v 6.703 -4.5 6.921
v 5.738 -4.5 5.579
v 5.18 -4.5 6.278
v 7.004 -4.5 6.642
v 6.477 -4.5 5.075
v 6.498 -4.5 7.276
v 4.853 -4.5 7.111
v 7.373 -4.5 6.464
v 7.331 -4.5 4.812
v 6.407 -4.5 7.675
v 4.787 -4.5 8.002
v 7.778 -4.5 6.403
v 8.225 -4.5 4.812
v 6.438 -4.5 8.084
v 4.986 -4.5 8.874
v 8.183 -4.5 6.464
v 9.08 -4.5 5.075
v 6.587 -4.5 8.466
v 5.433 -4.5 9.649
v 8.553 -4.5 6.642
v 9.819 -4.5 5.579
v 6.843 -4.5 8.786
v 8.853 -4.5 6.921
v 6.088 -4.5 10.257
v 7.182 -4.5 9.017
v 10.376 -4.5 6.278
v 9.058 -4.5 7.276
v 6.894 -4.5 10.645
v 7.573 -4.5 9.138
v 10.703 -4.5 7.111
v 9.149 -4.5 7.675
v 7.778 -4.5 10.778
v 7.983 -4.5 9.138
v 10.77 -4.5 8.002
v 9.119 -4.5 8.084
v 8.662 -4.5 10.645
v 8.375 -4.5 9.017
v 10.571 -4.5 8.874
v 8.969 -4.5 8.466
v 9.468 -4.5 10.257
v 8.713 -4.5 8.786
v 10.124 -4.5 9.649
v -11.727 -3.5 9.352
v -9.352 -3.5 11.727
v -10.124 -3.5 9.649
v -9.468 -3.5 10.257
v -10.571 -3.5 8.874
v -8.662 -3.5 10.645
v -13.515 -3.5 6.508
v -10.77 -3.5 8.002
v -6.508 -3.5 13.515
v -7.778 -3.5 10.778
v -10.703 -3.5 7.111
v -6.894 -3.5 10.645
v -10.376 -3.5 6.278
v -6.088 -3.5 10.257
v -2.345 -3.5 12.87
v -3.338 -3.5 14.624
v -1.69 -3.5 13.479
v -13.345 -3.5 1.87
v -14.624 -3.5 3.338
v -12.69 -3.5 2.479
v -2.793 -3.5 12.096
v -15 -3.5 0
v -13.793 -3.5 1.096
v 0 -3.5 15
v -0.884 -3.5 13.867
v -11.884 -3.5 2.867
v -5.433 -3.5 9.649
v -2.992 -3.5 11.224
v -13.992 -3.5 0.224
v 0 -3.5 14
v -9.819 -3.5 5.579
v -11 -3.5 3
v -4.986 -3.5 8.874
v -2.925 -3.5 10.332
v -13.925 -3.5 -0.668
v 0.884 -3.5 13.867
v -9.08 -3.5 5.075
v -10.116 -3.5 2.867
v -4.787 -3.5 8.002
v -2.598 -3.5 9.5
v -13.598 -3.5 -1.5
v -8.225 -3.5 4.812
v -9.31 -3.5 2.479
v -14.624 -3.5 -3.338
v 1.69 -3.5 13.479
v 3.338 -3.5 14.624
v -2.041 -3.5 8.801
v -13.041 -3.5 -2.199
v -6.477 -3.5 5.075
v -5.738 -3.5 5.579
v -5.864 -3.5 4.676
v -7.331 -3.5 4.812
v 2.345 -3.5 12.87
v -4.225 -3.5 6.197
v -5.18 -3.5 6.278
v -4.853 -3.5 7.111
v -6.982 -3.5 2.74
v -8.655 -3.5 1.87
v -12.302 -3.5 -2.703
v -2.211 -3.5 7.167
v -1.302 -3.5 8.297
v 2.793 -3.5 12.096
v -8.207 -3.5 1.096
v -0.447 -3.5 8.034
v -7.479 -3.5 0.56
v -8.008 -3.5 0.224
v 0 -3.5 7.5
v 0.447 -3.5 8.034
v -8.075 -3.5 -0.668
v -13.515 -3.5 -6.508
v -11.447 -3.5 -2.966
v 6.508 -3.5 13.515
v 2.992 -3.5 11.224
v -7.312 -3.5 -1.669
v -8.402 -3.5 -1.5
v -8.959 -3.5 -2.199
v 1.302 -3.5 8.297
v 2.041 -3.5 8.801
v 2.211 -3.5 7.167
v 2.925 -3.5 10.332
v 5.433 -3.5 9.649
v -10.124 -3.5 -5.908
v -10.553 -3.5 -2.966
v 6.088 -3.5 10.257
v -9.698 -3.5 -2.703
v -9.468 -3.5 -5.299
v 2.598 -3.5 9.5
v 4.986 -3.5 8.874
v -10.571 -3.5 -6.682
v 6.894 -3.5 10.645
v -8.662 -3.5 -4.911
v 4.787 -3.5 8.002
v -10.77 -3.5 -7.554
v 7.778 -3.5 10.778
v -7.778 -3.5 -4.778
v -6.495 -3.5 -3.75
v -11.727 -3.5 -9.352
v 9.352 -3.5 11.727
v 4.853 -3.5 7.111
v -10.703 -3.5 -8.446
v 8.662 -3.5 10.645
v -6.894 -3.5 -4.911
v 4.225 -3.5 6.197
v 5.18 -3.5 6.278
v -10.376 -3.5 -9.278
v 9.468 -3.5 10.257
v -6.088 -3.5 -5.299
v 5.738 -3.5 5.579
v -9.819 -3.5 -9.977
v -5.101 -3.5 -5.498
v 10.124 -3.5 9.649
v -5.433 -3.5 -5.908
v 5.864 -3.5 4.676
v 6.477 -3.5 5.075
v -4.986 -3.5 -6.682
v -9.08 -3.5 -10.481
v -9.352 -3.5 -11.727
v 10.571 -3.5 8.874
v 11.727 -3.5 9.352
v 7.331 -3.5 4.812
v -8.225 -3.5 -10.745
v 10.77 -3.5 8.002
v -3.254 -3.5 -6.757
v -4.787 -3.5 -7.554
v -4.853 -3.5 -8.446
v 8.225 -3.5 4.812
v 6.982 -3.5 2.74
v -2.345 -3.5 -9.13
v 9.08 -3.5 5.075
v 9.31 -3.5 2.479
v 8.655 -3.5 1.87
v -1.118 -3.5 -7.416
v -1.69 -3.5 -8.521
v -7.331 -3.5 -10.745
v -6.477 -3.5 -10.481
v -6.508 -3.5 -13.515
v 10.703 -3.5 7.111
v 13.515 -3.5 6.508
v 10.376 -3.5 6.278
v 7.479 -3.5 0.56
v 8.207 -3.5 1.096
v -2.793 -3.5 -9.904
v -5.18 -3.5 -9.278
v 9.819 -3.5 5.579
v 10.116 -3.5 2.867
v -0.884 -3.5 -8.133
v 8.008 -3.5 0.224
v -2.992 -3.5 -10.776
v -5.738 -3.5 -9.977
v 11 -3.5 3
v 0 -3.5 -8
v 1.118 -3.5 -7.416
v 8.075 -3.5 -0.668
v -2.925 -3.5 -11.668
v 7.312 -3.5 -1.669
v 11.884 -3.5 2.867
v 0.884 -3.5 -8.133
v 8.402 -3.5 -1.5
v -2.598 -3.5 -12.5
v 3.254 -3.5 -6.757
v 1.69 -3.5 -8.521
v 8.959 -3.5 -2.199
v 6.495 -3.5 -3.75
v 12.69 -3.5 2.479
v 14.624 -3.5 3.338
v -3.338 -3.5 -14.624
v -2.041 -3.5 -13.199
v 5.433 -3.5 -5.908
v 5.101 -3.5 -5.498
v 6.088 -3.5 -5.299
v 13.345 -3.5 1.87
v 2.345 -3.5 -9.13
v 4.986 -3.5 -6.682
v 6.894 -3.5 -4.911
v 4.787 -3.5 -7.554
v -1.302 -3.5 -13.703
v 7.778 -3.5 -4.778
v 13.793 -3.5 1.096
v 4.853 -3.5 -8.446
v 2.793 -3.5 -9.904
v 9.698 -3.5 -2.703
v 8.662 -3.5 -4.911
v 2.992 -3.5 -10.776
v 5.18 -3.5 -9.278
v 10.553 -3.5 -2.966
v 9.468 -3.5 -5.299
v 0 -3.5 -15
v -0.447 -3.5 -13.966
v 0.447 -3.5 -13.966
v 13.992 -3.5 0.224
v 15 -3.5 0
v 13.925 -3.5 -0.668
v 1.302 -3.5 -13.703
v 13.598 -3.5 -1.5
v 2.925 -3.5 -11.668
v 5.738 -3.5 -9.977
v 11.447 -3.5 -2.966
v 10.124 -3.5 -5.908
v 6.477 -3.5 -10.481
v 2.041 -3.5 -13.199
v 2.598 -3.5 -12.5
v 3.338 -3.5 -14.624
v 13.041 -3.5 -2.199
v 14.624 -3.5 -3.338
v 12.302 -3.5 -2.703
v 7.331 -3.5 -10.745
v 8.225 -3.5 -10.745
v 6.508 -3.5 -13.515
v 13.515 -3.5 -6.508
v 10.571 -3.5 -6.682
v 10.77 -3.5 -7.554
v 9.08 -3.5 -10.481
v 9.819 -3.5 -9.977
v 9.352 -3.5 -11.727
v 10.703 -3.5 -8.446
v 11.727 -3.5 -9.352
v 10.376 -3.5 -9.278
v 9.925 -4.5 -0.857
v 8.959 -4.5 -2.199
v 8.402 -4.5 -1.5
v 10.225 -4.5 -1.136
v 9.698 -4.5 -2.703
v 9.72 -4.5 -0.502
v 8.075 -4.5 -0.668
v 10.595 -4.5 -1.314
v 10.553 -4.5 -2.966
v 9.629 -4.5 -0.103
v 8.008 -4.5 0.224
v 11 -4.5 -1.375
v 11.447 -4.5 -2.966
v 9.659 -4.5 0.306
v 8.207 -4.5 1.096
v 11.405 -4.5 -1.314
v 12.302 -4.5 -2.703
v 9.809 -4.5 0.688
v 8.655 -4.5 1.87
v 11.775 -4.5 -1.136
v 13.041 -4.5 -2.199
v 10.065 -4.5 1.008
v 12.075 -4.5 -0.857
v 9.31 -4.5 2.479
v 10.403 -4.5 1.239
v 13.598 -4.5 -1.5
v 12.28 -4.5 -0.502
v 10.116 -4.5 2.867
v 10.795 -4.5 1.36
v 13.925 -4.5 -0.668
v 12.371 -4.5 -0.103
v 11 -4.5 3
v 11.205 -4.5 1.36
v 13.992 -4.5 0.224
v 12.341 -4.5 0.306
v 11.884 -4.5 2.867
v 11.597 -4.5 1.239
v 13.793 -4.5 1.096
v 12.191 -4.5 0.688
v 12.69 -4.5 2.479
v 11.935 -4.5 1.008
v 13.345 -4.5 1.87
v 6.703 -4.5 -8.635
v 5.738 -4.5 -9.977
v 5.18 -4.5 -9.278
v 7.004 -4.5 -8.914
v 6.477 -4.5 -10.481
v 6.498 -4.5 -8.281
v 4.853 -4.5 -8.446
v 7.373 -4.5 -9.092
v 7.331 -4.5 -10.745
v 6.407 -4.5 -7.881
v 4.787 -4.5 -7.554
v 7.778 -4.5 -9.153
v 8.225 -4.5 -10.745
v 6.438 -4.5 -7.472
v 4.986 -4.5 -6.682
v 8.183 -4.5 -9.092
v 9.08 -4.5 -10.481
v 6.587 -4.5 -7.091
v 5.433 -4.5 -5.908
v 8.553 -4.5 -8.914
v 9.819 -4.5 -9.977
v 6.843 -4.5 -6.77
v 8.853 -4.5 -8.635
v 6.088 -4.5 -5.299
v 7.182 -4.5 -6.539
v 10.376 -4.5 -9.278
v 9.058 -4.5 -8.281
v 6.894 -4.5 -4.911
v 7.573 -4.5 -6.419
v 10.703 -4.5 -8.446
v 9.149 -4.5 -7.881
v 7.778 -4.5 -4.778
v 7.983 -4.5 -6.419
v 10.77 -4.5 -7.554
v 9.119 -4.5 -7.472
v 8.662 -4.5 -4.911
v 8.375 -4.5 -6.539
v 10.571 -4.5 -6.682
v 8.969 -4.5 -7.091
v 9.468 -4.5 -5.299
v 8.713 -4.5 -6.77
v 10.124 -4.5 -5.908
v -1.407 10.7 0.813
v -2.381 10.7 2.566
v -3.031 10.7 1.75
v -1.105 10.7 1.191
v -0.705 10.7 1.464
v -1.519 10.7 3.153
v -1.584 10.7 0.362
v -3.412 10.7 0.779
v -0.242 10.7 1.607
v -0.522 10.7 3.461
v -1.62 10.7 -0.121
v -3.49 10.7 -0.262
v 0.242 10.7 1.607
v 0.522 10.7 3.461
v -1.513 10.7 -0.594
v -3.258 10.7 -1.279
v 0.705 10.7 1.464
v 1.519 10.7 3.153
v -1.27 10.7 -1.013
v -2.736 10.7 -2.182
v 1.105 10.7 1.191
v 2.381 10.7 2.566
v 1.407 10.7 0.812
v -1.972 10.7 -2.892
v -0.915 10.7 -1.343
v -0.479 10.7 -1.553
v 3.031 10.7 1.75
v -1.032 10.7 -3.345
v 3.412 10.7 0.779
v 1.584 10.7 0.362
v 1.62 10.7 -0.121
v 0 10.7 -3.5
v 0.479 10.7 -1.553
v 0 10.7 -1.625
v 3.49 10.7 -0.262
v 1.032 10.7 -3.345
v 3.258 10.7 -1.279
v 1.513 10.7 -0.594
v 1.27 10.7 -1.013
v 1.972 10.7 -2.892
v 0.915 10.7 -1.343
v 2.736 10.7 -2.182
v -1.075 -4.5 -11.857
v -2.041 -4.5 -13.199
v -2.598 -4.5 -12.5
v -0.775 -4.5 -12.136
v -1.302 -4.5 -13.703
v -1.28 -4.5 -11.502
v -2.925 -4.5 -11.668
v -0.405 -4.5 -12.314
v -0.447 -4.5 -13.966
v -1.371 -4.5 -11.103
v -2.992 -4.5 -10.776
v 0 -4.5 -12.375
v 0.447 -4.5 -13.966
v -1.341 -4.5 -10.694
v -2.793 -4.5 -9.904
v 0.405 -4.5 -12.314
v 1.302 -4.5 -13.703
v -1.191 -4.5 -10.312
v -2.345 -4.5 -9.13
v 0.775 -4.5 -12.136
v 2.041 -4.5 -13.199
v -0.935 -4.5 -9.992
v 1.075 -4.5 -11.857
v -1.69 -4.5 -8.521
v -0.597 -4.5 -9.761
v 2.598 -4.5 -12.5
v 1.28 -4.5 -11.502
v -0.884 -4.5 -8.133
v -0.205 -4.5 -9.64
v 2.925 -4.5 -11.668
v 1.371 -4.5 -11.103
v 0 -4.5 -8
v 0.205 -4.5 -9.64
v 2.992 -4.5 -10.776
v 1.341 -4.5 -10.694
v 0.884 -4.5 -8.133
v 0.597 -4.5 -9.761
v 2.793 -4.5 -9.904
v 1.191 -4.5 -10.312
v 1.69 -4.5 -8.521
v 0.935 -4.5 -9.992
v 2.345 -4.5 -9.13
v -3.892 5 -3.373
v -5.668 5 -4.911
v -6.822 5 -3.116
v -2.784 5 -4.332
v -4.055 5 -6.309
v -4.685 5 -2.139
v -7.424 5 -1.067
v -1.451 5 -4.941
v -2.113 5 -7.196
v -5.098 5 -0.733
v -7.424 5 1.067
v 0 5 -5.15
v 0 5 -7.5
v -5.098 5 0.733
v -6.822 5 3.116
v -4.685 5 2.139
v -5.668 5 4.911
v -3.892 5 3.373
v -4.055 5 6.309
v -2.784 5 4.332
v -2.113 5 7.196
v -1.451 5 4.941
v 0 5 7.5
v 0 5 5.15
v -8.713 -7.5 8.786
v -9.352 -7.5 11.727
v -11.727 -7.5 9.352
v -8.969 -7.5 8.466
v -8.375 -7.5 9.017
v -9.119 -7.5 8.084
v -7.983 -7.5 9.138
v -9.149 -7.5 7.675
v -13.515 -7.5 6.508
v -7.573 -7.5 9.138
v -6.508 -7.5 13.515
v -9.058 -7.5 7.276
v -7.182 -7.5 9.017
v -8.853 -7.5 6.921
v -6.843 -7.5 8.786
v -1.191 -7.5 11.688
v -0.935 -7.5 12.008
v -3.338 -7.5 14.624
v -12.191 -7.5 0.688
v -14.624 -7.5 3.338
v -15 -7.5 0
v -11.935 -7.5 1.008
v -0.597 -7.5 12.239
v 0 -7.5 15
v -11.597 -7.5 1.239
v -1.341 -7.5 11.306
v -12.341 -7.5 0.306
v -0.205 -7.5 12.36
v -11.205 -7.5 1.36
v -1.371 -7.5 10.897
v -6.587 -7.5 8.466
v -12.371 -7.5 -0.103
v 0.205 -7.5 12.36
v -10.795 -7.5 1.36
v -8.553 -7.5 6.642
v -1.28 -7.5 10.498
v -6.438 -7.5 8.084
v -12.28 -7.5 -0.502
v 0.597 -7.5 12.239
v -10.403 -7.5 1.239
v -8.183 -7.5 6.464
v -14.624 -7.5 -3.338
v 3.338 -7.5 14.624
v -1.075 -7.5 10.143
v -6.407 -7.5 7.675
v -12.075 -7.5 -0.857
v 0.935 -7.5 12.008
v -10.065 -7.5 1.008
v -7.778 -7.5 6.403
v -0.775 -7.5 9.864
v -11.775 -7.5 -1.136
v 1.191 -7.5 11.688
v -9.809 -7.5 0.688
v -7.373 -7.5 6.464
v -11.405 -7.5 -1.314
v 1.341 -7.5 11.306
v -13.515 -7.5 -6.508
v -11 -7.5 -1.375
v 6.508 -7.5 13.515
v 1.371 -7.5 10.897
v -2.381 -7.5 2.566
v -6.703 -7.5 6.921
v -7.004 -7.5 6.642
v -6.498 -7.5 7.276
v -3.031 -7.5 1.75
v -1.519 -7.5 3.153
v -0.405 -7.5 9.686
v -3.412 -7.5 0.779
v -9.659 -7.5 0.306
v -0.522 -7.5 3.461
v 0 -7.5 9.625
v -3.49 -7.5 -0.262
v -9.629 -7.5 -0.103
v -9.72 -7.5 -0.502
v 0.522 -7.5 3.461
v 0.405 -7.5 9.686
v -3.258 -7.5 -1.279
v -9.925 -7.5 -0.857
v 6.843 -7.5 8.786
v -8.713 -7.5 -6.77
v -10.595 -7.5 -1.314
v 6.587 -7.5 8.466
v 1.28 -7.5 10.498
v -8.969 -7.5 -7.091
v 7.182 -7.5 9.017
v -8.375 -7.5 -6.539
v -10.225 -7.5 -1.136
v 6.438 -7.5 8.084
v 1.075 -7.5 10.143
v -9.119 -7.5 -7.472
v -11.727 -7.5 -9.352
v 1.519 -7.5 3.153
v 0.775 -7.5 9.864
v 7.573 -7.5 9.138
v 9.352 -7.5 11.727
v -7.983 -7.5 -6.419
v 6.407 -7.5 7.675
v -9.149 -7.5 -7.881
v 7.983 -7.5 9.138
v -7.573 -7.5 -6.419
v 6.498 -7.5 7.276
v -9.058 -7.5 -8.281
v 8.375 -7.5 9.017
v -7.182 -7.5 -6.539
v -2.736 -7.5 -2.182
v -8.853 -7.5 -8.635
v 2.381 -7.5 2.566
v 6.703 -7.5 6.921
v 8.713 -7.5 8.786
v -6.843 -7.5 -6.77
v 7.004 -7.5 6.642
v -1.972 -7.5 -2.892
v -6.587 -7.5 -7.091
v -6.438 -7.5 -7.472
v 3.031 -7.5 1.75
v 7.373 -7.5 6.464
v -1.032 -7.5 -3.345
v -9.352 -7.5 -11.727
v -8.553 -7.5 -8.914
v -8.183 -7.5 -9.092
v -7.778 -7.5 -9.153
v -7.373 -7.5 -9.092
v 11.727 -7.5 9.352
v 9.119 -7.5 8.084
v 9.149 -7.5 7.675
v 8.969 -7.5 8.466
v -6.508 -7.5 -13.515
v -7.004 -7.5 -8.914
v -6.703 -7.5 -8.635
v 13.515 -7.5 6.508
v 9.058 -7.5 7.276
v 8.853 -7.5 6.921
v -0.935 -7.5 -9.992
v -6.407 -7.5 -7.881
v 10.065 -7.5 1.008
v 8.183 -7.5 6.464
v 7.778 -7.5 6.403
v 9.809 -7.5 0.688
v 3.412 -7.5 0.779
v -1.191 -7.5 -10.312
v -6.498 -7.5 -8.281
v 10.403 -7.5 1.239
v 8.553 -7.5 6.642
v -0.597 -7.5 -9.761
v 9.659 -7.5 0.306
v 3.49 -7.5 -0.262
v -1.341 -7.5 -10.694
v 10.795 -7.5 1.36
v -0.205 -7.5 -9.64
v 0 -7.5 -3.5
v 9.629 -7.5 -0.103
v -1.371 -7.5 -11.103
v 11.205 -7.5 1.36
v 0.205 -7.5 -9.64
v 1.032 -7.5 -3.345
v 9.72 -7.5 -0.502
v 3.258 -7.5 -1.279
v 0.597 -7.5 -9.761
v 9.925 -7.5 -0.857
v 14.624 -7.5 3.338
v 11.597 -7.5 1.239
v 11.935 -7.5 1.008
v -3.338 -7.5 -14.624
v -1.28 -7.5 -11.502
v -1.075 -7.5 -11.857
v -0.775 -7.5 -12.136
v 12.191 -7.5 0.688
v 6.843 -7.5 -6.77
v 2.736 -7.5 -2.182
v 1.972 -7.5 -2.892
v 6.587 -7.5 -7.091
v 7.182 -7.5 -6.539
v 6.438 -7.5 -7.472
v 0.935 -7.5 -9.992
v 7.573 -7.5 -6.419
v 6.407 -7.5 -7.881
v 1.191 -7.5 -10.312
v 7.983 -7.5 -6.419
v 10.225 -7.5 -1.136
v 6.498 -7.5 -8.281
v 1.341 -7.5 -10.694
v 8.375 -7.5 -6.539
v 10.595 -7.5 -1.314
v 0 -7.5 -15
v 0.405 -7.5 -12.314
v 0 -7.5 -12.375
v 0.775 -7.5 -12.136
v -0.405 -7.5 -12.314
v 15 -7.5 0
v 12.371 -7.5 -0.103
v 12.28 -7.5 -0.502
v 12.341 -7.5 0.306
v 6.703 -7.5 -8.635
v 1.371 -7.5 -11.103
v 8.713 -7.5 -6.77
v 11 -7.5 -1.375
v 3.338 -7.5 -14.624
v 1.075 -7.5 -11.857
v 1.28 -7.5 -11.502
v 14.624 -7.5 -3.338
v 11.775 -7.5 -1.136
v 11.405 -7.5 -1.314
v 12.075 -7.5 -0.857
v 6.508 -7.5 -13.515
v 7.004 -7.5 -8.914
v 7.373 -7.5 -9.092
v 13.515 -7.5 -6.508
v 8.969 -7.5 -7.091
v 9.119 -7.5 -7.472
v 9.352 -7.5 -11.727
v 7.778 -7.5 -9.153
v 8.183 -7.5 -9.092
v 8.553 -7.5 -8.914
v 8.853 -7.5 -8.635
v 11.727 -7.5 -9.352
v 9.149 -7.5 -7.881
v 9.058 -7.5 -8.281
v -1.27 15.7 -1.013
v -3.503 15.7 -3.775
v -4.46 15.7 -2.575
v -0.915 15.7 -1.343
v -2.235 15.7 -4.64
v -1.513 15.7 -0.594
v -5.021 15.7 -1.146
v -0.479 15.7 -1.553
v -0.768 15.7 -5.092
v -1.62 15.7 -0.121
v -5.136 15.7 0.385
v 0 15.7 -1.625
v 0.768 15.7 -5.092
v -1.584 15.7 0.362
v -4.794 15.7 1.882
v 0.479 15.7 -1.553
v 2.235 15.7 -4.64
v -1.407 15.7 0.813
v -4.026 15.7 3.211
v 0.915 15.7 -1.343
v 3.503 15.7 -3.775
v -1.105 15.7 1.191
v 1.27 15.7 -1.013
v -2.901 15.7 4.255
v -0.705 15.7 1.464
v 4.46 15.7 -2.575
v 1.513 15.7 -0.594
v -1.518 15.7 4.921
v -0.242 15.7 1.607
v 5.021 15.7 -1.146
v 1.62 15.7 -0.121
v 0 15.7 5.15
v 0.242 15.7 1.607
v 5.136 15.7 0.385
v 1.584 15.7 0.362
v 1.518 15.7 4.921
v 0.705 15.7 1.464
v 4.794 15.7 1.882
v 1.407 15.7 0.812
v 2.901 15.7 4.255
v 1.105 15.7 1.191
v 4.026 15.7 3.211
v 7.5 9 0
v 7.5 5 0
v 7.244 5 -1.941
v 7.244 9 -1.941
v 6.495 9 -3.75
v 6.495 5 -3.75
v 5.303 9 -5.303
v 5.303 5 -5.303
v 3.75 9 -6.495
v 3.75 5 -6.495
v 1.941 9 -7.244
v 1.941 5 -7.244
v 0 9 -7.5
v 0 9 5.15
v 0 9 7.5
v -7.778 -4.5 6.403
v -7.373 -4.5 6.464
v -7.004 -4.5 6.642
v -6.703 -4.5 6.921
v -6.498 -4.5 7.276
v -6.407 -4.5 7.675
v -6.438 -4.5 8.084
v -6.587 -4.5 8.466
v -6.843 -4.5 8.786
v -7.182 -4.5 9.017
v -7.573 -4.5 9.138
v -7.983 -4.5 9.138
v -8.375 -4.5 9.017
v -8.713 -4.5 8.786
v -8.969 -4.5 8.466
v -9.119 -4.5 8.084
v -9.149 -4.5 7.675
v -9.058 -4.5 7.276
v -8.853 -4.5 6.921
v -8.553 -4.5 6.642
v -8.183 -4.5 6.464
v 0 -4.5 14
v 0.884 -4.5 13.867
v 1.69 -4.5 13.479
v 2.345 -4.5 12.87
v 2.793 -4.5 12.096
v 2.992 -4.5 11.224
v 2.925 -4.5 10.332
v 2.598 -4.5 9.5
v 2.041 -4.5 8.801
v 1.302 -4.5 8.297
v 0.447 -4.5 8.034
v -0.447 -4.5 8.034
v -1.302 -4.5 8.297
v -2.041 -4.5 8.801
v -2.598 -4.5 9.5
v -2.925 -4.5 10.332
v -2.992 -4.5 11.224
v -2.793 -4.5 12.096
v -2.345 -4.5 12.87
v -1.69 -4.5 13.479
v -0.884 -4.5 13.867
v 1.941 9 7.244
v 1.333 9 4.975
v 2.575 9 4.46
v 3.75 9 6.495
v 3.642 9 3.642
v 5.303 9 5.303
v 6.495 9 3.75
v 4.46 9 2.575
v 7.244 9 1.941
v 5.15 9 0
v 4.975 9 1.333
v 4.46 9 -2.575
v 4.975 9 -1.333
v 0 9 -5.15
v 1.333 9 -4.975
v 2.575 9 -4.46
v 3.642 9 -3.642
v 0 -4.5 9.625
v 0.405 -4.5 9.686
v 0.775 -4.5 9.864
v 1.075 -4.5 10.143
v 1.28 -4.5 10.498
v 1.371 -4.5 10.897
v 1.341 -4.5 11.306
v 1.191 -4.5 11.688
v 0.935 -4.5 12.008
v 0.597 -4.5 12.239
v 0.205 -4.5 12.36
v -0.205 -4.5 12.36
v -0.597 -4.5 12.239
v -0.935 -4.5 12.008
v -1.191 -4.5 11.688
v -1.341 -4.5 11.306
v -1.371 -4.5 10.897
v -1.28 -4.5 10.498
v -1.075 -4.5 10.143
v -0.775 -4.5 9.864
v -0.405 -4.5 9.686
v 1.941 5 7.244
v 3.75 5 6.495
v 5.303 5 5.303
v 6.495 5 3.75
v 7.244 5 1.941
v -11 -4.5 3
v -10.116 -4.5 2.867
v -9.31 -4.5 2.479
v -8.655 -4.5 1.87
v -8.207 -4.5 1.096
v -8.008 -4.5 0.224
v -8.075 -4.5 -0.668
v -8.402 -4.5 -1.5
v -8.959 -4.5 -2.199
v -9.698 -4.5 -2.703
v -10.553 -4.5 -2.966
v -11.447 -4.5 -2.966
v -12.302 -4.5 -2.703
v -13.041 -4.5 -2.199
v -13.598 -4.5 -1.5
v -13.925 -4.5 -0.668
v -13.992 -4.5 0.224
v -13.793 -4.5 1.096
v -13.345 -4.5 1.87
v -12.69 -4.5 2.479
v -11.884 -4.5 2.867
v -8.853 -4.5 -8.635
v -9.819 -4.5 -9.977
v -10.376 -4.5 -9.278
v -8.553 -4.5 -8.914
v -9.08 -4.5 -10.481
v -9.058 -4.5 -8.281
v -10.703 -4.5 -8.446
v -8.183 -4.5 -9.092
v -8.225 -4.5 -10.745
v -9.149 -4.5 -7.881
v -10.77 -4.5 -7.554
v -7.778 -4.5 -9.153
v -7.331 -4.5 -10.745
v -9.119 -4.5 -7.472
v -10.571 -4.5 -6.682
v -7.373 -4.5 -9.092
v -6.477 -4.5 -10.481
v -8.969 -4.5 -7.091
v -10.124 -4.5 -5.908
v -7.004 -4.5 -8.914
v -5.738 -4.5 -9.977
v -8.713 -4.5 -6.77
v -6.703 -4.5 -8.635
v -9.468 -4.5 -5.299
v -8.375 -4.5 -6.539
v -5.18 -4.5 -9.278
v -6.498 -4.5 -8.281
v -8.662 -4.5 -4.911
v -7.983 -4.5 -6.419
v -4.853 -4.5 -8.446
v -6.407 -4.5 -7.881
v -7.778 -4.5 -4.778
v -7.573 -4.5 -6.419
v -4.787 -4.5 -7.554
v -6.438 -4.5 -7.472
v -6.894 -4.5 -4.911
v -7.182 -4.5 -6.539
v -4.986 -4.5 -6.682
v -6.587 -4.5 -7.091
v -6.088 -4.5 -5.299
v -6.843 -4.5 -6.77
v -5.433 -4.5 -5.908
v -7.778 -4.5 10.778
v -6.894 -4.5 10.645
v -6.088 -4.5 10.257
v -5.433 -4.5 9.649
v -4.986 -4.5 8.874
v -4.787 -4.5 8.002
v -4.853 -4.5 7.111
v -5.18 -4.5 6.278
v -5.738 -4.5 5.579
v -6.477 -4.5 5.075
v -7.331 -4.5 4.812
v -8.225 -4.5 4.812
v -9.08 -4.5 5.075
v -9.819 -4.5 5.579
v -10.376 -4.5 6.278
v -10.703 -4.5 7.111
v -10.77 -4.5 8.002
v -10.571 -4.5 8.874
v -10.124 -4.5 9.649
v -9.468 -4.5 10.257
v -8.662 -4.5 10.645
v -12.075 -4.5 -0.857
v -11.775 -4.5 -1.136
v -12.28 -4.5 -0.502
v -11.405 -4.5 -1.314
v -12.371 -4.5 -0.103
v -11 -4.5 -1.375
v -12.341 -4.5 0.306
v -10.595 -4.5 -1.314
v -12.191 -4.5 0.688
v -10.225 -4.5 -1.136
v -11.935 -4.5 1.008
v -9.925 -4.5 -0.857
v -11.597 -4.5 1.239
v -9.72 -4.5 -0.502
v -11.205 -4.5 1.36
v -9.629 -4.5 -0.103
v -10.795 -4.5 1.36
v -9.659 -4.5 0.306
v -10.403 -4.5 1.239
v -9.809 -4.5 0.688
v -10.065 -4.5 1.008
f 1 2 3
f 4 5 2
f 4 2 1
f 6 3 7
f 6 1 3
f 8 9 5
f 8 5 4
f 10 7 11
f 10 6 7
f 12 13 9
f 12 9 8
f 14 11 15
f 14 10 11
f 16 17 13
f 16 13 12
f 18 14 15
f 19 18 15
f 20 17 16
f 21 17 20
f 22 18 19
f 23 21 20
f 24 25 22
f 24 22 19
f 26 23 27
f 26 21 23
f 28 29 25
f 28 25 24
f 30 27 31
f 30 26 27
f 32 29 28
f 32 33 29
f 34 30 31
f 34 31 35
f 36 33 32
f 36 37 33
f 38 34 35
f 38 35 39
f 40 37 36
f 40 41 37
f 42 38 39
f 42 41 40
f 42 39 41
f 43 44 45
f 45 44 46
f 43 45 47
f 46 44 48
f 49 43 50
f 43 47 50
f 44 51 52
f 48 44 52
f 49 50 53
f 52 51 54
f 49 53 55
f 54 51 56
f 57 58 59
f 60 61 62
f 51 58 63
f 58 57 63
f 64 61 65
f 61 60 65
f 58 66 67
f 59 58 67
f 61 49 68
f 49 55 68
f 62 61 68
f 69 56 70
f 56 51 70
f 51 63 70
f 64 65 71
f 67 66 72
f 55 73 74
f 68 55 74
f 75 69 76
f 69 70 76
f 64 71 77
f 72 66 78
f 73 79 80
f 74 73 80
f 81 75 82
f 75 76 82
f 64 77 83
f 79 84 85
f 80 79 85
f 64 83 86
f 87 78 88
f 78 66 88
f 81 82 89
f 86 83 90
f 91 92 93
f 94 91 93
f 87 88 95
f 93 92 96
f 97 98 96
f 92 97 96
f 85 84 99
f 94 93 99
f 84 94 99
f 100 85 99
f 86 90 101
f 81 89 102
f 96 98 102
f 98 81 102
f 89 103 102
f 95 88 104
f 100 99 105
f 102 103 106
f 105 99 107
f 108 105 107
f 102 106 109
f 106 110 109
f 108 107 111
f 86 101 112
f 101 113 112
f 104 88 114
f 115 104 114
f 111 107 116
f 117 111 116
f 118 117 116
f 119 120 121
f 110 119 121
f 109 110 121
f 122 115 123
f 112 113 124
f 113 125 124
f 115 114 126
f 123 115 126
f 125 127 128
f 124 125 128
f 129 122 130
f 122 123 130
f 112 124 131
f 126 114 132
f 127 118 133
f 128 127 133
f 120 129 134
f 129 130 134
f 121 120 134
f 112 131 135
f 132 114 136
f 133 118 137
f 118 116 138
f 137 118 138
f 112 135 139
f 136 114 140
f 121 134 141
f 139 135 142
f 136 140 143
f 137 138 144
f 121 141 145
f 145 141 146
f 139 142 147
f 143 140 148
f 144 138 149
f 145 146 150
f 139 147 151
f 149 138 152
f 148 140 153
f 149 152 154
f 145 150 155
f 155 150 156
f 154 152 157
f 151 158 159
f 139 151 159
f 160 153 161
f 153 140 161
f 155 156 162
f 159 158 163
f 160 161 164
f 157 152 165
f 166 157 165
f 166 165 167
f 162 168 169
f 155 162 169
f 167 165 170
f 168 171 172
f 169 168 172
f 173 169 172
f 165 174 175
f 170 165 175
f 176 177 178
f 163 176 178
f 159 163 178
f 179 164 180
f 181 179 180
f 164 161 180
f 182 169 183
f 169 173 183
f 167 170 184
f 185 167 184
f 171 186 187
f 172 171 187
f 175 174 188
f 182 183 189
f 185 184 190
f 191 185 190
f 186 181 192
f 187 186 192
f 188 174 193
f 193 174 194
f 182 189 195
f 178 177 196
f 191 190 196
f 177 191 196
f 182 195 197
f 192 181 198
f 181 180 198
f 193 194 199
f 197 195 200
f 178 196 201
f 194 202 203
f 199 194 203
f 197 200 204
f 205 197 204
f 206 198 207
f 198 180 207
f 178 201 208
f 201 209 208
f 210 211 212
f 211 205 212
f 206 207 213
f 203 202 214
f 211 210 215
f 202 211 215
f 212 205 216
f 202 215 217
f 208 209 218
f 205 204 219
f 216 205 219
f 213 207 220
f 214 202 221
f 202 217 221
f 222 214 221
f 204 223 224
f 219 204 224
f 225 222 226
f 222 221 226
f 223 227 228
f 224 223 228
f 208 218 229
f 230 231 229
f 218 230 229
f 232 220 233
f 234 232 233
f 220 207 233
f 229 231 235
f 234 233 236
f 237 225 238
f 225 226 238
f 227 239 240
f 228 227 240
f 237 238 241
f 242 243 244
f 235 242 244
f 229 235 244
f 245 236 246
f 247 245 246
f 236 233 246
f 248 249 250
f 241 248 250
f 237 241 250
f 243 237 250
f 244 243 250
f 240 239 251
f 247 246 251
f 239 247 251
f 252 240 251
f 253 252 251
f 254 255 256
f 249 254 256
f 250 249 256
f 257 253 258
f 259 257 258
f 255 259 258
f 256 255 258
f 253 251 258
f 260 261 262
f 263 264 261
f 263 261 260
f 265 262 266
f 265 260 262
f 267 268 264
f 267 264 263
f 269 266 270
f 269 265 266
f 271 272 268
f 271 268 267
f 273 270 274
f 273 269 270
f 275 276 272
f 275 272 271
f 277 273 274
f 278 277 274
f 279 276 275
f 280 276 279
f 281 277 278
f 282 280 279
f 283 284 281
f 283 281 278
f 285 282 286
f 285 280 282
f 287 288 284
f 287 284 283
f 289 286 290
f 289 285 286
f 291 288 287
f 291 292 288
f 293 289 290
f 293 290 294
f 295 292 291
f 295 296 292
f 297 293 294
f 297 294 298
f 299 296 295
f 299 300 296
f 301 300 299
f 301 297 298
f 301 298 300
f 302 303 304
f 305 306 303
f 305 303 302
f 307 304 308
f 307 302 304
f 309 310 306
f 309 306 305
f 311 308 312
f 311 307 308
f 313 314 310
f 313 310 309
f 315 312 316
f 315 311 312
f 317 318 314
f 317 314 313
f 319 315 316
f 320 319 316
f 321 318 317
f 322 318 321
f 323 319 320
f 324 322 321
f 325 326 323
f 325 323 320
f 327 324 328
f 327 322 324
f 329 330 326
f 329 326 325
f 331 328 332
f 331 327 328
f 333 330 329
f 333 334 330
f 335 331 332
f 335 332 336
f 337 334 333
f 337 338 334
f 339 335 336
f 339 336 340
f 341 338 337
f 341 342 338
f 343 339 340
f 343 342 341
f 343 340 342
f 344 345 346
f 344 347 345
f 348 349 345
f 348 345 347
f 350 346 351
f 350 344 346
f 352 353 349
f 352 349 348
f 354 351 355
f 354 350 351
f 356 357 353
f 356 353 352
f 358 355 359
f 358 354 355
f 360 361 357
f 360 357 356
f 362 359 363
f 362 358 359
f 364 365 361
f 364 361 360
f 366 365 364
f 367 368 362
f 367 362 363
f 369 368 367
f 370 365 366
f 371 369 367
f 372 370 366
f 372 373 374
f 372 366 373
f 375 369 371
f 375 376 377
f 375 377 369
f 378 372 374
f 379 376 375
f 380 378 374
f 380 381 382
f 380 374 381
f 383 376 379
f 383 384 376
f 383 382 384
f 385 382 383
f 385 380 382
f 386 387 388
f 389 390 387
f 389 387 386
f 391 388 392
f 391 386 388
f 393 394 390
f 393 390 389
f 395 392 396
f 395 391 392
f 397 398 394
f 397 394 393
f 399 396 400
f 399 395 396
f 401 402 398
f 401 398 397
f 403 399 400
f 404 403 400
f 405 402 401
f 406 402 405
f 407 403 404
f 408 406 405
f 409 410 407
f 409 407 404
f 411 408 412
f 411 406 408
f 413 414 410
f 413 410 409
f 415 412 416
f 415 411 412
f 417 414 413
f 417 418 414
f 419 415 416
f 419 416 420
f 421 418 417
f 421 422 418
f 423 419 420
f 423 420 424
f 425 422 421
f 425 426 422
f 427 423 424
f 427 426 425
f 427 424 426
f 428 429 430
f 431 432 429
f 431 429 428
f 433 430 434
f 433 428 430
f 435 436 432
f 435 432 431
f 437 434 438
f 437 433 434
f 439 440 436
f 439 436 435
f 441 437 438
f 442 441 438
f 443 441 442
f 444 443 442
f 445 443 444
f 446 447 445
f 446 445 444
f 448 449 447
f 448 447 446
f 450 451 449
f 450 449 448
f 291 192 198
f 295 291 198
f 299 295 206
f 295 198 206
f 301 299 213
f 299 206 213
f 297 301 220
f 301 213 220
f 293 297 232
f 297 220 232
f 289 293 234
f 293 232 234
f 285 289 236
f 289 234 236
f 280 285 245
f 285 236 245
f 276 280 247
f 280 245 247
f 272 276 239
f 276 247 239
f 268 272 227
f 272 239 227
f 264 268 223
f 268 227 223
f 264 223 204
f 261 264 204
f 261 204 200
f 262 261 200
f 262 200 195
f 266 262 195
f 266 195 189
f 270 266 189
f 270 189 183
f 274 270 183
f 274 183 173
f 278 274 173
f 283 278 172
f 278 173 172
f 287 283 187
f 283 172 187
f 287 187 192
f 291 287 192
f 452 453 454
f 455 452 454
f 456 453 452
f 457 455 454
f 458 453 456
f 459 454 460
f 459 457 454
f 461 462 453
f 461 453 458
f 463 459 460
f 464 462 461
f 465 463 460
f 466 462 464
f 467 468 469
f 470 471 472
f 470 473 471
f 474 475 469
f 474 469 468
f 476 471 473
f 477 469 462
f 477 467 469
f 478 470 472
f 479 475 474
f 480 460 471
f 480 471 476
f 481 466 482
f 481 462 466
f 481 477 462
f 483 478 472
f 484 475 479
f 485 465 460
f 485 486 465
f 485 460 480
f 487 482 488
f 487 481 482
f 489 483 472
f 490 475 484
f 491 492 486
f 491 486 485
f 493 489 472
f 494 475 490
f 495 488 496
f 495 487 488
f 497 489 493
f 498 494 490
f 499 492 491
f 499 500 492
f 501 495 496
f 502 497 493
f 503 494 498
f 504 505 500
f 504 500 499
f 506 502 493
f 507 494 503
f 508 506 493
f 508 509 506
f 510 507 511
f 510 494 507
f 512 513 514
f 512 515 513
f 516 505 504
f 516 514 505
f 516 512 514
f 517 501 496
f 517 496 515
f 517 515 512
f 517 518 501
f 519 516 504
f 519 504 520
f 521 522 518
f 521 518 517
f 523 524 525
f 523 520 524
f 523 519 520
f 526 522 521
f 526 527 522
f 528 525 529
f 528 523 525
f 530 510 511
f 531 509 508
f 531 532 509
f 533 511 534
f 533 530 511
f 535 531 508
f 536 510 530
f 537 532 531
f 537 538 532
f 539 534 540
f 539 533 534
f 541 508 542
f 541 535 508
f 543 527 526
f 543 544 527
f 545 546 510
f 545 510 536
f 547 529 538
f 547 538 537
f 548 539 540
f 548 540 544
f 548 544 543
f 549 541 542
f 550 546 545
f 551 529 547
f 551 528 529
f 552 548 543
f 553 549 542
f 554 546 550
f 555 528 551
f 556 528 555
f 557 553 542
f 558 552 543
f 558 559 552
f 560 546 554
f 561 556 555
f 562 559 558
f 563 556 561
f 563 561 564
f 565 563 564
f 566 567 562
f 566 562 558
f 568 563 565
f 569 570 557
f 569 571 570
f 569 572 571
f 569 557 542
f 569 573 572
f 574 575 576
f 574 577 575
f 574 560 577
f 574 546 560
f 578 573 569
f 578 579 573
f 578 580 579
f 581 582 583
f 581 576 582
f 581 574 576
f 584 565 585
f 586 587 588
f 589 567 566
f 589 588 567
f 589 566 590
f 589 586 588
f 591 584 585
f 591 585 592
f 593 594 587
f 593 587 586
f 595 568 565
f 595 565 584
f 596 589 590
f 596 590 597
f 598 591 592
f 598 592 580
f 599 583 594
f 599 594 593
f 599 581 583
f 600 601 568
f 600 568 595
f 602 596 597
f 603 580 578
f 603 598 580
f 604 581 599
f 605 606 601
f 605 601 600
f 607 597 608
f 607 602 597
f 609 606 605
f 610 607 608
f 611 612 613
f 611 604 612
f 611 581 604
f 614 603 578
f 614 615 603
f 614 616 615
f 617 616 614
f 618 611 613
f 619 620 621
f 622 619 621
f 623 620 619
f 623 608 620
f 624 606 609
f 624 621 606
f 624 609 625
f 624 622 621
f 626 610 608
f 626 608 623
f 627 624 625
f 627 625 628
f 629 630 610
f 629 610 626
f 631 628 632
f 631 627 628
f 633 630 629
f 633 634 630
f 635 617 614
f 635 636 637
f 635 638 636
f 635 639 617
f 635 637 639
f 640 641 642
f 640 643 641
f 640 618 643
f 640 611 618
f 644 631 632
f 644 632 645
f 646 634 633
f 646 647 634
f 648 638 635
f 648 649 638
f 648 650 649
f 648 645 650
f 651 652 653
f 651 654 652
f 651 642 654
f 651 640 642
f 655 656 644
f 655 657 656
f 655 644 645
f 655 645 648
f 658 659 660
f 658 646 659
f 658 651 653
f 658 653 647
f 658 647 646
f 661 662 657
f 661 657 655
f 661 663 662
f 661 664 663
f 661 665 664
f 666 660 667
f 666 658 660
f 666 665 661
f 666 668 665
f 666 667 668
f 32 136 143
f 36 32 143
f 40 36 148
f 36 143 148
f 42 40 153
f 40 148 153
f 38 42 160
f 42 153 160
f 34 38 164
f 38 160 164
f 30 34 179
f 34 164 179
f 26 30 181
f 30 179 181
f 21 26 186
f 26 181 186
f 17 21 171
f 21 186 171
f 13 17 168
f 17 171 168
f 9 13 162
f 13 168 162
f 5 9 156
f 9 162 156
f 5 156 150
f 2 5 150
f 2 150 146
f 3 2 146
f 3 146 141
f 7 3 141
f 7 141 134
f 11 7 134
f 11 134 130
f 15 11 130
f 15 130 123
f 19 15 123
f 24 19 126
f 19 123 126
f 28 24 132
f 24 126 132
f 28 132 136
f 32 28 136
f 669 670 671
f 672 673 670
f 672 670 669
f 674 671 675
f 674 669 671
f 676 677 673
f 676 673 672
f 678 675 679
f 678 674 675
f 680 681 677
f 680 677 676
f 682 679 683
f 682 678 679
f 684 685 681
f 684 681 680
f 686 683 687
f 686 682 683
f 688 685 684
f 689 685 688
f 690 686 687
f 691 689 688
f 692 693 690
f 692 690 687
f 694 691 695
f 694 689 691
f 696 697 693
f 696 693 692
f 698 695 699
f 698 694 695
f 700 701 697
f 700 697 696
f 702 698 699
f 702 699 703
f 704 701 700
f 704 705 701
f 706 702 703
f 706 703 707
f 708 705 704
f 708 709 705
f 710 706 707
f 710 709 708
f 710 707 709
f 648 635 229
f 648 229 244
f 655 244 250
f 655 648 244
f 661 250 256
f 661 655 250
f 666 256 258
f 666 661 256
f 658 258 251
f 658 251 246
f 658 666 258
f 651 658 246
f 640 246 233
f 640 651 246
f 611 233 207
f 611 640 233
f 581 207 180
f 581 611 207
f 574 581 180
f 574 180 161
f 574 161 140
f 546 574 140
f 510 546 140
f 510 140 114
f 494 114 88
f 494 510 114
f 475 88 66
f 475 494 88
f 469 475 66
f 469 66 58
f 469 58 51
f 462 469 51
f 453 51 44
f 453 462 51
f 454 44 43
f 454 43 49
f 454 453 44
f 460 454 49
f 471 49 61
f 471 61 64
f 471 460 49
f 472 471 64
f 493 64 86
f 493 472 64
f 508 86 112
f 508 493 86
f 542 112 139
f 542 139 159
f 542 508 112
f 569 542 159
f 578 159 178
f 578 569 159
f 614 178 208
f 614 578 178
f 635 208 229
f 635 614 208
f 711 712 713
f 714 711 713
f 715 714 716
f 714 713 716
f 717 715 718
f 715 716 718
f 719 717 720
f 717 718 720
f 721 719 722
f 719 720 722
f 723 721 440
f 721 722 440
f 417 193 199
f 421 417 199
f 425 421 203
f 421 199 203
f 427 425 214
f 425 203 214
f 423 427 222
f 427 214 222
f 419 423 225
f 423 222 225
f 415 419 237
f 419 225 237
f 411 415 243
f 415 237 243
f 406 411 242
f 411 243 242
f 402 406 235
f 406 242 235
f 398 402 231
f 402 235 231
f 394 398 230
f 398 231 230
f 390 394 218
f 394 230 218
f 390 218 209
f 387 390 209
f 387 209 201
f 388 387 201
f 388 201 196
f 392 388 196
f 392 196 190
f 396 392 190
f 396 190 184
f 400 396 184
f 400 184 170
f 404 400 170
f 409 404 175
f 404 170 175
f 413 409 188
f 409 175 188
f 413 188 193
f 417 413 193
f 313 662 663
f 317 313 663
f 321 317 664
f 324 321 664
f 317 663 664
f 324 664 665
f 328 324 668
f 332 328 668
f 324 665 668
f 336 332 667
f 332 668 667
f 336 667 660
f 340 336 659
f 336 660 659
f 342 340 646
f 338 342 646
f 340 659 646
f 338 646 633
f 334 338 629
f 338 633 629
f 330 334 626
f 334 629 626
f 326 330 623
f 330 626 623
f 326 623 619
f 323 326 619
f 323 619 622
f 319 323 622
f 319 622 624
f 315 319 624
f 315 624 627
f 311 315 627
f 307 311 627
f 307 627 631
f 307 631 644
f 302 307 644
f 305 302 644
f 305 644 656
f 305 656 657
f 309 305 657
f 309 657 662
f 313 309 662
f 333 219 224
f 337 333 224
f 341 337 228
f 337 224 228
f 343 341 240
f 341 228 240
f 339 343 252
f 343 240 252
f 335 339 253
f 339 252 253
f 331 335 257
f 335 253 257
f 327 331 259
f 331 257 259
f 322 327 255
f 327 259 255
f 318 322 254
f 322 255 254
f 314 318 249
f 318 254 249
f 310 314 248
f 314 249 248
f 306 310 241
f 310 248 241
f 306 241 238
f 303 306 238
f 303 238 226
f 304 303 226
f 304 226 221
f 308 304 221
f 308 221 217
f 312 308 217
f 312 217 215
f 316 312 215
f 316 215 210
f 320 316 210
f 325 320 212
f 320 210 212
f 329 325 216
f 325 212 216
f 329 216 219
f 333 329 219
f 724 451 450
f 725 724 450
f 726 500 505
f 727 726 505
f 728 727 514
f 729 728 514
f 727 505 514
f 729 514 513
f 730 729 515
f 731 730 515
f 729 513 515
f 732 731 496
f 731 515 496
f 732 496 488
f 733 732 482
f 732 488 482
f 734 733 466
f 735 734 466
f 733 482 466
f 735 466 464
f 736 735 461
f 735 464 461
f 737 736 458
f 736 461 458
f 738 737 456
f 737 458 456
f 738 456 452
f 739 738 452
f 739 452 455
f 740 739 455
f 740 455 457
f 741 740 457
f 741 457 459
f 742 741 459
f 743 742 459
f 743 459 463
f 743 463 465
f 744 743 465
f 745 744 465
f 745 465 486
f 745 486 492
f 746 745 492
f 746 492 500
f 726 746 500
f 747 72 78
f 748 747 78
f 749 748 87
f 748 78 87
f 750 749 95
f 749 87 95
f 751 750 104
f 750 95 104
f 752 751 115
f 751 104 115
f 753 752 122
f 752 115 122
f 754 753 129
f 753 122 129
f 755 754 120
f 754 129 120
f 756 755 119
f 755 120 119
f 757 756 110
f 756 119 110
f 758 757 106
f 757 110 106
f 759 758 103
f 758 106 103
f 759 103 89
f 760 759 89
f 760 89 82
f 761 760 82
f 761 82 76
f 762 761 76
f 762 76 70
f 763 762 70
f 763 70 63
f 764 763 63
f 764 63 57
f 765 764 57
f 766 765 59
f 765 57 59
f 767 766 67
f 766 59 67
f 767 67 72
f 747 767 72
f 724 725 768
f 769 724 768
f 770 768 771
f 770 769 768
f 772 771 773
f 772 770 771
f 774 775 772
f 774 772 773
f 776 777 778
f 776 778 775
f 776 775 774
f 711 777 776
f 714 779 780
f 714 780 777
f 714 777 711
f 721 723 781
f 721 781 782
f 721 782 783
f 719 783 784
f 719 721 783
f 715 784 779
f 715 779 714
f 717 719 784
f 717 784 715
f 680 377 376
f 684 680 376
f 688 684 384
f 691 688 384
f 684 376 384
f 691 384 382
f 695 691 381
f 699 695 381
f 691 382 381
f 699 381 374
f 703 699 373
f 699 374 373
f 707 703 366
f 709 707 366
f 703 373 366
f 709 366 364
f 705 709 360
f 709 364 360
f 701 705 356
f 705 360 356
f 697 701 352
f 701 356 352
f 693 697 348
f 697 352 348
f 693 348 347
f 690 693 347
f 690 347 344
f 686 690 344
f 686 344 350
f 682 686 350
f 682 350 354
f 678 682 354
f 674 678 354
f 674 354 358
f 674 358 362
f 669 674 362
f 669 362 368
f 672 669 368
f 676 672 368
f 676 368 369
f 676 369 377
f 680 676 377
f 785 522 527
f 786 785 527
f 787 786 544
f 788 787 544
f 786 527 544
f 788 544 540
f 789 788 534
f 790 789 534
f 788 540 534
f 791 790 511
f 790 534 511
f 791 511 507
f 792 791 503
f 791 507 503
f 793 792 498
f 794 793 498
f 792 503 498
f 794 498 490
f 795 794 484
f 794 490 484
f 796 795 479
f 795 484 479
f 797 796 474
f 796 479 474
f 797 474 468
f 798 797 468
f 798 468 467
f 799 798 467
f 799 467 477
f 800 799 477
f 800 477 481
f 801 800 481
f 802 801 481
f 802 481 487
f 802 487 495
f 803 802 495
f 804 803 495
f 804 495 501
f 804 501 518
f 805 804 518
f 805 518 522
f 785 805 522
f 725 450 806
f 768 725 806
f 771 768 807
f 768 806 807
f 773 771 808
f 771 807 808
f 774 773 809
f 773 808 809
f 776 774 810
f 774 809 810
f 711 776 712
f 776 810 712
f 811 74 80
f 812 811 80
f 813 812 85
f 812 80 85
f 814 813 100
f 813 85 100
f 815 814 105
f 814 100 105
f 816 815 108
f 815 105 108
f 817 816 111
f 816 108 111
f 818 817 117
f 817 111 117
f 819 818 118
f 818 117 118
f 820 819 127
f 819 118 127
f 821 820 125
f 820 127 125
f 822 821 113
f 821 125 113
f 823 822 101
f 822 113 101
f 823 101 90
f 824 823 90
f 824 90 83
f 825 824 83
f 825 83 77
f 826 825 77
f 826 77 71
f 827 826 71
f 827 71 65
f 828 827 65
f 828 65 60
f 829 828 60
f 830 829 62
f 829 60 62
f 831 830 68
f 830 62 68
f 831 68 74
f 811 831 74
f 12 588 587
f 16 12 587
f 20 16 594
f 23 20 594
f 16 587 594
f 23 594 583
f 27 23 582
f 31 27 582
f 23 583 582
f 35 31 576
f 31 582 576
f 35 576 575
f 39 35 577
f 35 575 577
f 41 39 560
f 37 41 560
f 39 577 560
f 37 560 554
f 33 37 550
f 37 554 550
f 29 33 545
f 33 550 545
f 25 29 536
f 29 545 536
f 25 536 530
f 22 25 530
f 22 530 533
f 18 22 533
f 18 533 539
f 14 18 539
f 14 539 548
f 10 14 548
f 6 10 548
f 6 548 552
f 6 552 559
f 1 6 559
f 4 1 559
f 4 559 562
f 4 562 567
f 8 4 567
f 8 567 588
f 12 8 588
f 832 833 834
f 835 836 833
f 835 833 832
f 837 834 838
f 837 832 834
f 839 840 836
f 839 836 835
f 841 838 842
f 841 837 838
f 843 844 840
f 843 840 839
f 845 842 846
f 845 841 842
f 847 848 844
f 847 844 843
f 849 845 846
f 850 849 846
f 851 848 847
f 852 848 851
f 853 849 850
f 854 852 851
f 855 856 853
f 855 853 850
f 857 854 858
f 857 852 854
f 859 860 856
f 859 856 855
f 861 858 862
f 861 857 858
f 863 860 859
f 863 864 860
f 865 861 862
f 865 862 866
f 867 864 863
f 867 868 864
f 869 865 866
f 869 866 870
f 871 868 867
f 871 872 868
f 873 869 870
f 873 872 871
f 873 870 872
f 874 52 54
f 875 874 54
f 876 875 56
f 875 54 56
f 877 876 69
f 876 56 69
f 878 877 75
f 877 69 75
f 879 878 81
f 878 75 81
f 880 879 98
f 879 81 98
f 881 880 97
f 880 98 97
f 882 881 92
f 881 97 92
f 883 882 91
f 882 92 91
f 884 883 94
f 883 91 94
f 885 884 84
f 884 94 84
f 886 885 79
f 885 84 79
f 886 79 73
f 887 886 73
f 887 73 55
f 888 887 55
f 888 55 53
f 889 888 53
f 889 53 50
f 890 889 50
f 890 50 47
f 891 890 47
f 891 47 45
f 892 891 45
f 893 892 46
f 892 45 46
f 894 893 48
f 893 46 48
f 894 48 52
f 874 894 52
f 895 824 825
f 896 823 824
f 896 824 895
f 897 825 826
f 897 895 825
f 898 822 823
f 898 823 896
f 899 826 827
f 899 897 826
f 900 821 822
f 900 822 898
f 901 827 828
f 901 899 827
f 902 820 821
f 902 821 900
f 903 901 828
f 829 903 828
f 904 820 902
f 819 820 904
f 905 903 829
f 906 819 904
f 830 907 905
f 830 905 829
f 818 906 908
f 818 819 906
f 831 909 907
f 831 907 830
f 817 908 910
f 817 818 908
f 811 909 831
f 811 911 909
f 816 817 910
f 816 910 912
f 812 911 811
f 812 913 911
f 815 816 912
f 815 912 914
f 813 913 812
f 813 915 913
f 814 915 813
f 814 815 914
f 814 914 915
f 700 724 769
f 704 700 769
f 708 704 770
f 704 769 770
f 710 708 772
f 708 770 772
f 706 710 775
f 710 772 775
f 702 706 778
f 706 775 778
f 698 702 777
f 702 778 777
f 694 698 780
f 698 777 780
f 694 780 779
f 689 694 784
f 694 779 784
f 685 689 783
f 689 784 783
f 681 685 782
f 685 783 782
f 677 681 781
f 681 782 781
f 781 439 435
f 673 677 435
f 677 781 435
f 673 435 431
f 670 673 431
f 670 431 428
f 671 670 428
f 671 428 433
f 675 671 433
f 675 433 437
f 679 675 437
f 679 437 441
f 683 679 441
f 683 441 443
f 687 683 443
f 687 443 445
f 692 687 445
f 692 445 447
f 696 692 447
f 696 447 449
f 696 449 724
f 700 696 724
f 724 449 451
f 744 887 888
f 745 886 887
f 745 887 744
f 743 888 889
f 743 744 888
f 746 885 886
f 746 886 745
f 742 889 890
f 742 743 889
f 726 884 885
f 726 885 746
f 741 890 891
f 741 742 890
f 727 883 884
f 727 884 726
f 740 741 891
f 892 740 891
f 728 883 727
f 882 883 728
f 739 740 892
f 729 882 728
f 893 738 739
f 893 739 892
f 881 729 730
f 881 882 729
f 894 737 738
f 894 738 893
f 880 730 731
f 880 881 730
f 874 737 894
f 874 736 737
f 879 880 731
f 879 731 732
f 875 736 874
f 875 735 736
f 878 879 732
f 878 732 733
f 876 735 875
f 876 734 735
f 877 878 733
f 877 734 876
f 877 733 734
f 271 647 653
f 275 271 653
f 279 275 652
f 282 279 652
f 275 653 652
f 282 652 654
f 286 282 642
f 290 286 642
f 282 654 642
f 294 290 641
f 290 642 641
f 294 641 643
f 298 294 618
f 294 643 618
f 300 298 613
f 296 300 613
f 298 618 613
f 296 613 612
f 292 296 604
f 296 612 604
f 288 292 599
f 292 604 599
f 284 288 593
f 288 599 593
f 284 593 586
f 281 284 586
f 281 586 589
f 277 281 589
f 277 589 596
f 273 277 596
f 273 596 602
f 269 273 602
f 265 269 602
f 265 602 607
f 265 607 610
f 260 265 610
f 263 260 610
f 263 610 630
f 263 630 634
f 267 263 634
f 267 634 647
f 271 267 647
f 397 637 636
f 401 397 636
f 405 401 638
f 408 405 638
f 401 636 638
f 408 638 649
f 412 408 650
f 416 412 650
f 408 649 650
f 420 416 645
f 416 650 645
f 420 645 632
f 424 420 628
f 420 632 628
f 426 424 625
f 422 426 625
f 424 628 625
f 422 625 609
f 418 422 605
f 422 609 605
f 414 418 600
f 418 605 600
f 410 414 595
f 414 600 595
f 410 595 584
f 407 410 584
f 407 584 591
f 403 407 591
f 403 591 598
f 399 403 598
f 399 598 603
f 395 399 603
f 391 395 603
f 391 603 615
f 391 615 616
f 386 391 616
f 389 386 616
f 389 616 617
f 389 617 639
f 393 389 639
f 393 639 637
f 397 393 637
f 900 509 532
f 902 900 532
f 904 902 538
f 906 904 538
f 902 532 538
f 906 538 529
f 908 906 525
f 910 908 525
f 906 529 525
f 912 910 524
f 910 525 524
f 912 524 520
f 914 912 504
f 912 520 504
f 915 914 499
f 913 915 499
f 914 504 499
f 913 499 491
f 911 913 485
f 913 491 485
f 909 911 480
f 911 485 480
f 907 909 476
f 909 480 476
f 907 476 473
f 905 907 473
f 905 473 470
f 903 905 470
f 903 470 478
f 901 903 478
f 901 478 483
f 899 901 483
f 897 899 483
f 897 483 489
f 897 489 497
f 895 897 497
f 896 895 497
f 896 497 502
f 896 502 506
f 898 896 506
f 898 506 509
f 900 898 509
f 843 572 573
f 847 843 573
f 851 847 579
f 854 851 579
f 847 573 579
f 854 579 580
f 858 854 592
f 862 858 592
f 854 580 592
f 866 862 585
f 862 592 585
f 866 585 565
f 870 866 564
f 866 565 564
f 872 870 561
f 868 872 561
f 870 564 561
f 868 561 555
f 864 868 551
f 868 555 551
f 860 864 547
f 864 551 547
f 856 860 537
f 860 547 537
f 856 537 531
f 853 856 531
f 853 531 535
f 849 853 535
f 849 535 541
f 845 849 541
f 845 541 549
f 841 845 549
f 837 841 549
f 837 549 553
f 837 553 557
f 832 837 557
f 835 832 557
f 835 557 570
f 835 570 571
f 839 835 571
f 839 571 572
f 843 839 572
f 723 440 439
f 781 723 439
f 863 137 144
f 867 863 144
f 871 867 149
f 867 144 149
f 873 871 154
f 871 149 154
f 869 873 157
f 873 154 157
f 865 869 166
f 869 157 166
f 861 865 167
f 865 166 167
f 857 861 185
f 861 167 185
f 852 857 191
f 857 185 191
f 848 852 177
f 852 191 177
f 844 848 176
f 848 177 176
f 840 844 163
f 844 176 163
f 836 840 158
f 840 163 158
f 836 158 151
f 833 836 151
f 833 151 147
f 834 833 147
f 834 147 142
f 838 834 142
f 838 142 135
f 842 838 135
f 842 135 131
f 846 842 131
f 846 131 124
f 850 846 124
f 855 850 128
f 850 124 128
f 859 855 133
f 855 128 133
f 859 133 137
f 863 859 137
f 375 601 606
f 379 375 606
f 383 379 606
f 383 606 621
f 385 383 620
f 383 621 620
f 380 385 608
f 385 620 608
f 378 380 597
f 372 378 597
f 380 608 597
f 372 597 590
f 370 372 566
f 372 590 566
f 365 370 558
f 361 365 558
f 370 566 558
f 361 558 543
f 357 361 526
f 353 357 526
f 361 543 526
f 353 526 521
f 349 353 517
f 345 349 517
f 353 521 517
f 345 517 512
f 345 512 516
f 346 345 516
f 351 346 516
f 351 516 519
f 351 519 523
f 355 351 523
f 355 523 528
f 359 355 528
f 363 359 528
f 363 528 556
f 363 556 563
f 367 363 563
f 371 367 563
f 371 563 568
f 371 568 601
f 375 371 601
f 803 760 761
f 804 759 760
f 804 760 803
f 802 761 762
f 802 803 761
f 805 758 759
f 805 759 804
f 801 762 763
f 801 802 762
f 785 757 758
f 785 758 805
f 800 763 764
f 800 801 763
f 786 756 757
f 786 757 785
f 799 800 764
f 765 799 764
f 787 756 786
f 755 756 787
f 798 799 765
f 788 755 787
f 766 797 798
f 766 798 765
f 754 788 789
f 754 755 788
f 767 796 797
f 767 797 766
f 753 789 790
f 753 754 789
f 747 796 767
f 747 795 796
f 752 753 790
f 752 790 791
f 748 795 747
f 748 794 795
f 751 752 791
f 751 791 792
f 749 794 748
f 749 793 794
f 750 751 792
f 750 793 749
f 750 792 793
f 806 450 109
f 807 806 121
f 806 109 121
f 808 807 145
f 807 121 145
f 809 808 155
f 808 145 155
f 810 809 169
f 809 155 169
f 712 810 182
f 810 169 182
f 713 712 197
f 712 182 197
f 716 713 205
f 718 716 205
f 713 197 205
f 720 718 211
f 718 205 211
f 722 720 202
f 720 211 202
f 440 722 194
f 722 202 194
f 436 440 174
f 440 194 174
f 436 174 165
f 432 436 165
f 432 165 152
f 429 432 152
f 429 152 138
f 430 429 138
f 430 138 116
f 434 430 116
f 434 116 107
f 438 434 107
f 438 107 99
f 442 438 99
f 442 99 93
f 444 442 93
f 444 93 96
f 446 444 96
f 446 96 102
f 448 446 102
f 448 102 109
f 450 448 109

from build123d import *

# Parameters (mm, degrees)
SKETCH1_R           = 7.5
BOSS_EXTRUDE1_DEPTH = 5
SKETCH1_3_R         = 5.15
BOSS_EXTRUDE2_DEPTH = 15.7
BOSS_EXTRUDE3_DEPTH = 4
SKETCH3_R           = 1.625
CUT_EXTRUDE1_DEPTH  = 37
SKETCH4_R           = 3.5
CUT_EXTRUDE2_DEPTH  = 10.7
BOSS_EXTRUDE4_START = 3.5
SKETCH5_R           = 7.5
SKETCH5_R_2         = 3.5
BOSS_EXTRUDE4_DEPTH = 3.5
BOSS_EXTRUDE5_START = 4
SKETCH6_R           = 15
SKETCH6_R_2         = 1.375
SKETCH6_R_3         = 3.5
BOSS_EXTRUDE5_DEPTH = 4
SKETCH7_R           = 3
CUT_EXTRUDE3_DEPTH  = 1
CUT_EXTRUDE4_START  = -12.5
SKETCH8_R           = 7.5
SKETCH8_R_2         = 7.45
CUT_EXTRUDE4_DEPTH  = 12.5
BOSS_EXTRUDE6_START = -8.5
SKETCH9_R           = 7.5
SKETCH9_R_2         = 7.45
BOSS_EXTRUDE6_DEPTH = 8.5
BOSS_EXTRUDE7_DEPTH = 4


with BuildPart() as part:
    # Sketch1 → Boss-Extrude1 (new body)
    with BuildSketch(Plane(origin=(0, 0, 0), x_dir=(1, 0, 0), z_dir=(0, 1, 0))):
        Circle(SKETCH1_R)
    extrude(amount=BOSS_EXTRUDE1_DEPTH)

    # Sketch1<3> → Boss-Extrude2 (add)
    with BuildSketch(Plane(origin=(0, 0, 0), x_dir=(1, 0, 0), z_dir=(0, 1, 0))):
        Circle(SKETCH1_3_R)
    extrude(amount=BOSS_EXTRUDE2_DEPTH)

    # Sketch2 → Boss-Extrude3 (add)
    with BuildSketch(Plane(origin=(0, 5, 0), x_dir=(1, 0, 0), z_dir=(0, 1, 0))):
        with BuildLine():
            ThreePointArc((7.5, 0), (5.303300859, 5.303300859), (0, 7.5))
            Line((0, 7.5), (0, 5.15))
            ThreePointArc((0, 5.15), (3.641599923, 3.641599923), (5.15, 0))
            ThreePointArc((5.15, 0), (3.641599923, -3.641599923), (0, -5.15))
            Line((0, -5.15), (0, -7.5))
            ThreePointArc((0, -7.5), (5.303300859, -5.303300859), (7.5, 0))
        make_face()
    extrude(amount=BOSS_EXTRUDE3_DEPTH)

    # Sketch3 → Cut-Extrude1 (cut)
    with BuildSketch(Plane.XZ):
        Circle(SKETCH3_R)
    extrude(amount=-CUT_EXTRUDE1_DEPTH, mode=Mode.SUBTRACT)

    # Sketch4 → Cut-Extrude2 (cut)
    with BuildSketch(Plane.XZ):
        Circle(SKETCH4_R)
    extrude(amount=-CUT_EXTRUDE2_DEPTH, mode=Mode.SUBTRACT)

    # Sketch5 → Boss-Extrude4 (add)
    with BuildSketch(Plane.XZ.offset(BOSS_EXTRUDE4_START)):
        Circle(SKETCH5_R)
        Circle(SKETCH5_R_2, mode=Mode.SUBTRACT)
    extrude(amount=-BOSS_EXTRUDE4_DEPTH)

    # Sketch6 → Boss-Extrude5 (add)
    with BuildSketch(Plane.XZ.offset(3.5).offset(BOSS_EXTRUDE5_START)):
        Circle(SKETCH6_R)
        with Locations((11, 0)):
            Circle(SKETCH6_R_2, mode=Mode.SUBTRACT)
        with Locations((7.778174593, -7.778174593)):
            Circle(SKETCH6_R_2, mode=Mode.SUBTRACT)
        with Locations((0, -11)):
            Circle(SKETCH6_R_2, mode=Mode.SUBTRACT)
        with Locations((-7.778174593, -7.778174593)):
            Circle(SKETCH6_R_2, mode=Mode.SUBTRACT)
        with Locations((-11, 0)):
            Circle(SKETCH6_R_2, mode=Mode.SUBTRACT)
        with Locations((-7.778174593, 7.778174593)):
            Circle(SKETCH6_R_2, mode=Mode.SUBTRACT)
        with Locations((0, 11)):
            Circle(SKETCH6_R_2, mode=Mode.SUBTRACT)
        with Locations((7.778174593, 7.778174593)):
            Circle(SKETCH6_R_2, mode=Mode.SUBTRACT)
        Circle(SKETCH6_R_3, mode=Mode.SUBTRACT)
    extrude(amount=-BOSS_EXTRUDE5_DEPTH)

    # Sketch7 → Cut-Extrude3 (cut)
    with BuildSketch(Plane(origin=(0, -3.5, 0), x_dir=(1, 0, 0), z_dir=(0, 1, 0))):
        with Locations((-11, 0)):
            Circle(SKETCH7_R)
        with Locations((-7.778174593, 7.778174593)):
            Circle(SKETCH7_R)
        with Locations((0, 11)):
            Circle(SKETCH7_R)
        with Locations((7.778174593, 7.778174593)):
            Circle(SKETCH7_R)
        with Locations((11, 0)):
            Circle(SKETCH7_R)
        with Locations((7.778174593, -7.778174593)):
            Circle(SKETCH7_R)
        with Locations((0, -11)):
            Circle(SKETCH7_R)
        with Locations((-7.778174593, -7.778174593)):
            Circle(SKETCH7_R)
    extrude(amount=-CUT_EXTRUDE3_DEPTH, mode=Mode.SUBTRACT)

    # Sketch8 → Cut-Extrude4 (cut)
    with BuildSketch(Plane(origin=(0, 9, 0), x_dir=(1, 0, 0), z_dir=(0, 1, 0)).offset(CUT_EXTRUDE4_START)):
        Circle(SKETCH8_R)
        Circle(SKETCH8_R_2, mode=Mode.SUBTRACT)
    extrude(amount=CUT_EXTRUDE4_DEPTH, mode=Mode.SUBTRACT)

    # Sketch9 → Boss-Extrude6 (add)
    with BuildSketch(Plane(origin=(0, 5, 0), x_dir=(1, 0, 0), z_dir=(0, 1, 0)).offset(BOSS_EXTRUDE6_START)):
        Circle(SKETCH9_R)
        Circle(SKETCH9_R_2, mode=Mode.SUBTRACT)
    extrude(amount=BOSS_EXTRUDE6_DEPTH)

    # Sketch10 → Boss-Extrude7 (add)
    with BuildSketch(Plane(origin=(0, 5, 0), x_dir=(1, 0, 0), z_dir=(0, 1, 0))):
        with BuildLine():
            ThreePointArc((7.5, 0), (5.303300859, 5.303300859), (0, 7.5))
            Line((0, 7.5), (0, 7.45))
            ThreePointArc((0, 7.45), (5.26794552, 5.26794552), (7.45, 0))
            ThreePointArc((7.45, 0), (5.26794552, -5.26794552), (0, -7.45))
            Line((0, -7.45), (0, -7.5))
            ThreePointArc((0, -7.5), (5.303300859, -5.303300859), (7.5, 0))
        make_face()
    extrude(amount=BOSS_EXTRUDE7_DEPTH)


solid = part.part
